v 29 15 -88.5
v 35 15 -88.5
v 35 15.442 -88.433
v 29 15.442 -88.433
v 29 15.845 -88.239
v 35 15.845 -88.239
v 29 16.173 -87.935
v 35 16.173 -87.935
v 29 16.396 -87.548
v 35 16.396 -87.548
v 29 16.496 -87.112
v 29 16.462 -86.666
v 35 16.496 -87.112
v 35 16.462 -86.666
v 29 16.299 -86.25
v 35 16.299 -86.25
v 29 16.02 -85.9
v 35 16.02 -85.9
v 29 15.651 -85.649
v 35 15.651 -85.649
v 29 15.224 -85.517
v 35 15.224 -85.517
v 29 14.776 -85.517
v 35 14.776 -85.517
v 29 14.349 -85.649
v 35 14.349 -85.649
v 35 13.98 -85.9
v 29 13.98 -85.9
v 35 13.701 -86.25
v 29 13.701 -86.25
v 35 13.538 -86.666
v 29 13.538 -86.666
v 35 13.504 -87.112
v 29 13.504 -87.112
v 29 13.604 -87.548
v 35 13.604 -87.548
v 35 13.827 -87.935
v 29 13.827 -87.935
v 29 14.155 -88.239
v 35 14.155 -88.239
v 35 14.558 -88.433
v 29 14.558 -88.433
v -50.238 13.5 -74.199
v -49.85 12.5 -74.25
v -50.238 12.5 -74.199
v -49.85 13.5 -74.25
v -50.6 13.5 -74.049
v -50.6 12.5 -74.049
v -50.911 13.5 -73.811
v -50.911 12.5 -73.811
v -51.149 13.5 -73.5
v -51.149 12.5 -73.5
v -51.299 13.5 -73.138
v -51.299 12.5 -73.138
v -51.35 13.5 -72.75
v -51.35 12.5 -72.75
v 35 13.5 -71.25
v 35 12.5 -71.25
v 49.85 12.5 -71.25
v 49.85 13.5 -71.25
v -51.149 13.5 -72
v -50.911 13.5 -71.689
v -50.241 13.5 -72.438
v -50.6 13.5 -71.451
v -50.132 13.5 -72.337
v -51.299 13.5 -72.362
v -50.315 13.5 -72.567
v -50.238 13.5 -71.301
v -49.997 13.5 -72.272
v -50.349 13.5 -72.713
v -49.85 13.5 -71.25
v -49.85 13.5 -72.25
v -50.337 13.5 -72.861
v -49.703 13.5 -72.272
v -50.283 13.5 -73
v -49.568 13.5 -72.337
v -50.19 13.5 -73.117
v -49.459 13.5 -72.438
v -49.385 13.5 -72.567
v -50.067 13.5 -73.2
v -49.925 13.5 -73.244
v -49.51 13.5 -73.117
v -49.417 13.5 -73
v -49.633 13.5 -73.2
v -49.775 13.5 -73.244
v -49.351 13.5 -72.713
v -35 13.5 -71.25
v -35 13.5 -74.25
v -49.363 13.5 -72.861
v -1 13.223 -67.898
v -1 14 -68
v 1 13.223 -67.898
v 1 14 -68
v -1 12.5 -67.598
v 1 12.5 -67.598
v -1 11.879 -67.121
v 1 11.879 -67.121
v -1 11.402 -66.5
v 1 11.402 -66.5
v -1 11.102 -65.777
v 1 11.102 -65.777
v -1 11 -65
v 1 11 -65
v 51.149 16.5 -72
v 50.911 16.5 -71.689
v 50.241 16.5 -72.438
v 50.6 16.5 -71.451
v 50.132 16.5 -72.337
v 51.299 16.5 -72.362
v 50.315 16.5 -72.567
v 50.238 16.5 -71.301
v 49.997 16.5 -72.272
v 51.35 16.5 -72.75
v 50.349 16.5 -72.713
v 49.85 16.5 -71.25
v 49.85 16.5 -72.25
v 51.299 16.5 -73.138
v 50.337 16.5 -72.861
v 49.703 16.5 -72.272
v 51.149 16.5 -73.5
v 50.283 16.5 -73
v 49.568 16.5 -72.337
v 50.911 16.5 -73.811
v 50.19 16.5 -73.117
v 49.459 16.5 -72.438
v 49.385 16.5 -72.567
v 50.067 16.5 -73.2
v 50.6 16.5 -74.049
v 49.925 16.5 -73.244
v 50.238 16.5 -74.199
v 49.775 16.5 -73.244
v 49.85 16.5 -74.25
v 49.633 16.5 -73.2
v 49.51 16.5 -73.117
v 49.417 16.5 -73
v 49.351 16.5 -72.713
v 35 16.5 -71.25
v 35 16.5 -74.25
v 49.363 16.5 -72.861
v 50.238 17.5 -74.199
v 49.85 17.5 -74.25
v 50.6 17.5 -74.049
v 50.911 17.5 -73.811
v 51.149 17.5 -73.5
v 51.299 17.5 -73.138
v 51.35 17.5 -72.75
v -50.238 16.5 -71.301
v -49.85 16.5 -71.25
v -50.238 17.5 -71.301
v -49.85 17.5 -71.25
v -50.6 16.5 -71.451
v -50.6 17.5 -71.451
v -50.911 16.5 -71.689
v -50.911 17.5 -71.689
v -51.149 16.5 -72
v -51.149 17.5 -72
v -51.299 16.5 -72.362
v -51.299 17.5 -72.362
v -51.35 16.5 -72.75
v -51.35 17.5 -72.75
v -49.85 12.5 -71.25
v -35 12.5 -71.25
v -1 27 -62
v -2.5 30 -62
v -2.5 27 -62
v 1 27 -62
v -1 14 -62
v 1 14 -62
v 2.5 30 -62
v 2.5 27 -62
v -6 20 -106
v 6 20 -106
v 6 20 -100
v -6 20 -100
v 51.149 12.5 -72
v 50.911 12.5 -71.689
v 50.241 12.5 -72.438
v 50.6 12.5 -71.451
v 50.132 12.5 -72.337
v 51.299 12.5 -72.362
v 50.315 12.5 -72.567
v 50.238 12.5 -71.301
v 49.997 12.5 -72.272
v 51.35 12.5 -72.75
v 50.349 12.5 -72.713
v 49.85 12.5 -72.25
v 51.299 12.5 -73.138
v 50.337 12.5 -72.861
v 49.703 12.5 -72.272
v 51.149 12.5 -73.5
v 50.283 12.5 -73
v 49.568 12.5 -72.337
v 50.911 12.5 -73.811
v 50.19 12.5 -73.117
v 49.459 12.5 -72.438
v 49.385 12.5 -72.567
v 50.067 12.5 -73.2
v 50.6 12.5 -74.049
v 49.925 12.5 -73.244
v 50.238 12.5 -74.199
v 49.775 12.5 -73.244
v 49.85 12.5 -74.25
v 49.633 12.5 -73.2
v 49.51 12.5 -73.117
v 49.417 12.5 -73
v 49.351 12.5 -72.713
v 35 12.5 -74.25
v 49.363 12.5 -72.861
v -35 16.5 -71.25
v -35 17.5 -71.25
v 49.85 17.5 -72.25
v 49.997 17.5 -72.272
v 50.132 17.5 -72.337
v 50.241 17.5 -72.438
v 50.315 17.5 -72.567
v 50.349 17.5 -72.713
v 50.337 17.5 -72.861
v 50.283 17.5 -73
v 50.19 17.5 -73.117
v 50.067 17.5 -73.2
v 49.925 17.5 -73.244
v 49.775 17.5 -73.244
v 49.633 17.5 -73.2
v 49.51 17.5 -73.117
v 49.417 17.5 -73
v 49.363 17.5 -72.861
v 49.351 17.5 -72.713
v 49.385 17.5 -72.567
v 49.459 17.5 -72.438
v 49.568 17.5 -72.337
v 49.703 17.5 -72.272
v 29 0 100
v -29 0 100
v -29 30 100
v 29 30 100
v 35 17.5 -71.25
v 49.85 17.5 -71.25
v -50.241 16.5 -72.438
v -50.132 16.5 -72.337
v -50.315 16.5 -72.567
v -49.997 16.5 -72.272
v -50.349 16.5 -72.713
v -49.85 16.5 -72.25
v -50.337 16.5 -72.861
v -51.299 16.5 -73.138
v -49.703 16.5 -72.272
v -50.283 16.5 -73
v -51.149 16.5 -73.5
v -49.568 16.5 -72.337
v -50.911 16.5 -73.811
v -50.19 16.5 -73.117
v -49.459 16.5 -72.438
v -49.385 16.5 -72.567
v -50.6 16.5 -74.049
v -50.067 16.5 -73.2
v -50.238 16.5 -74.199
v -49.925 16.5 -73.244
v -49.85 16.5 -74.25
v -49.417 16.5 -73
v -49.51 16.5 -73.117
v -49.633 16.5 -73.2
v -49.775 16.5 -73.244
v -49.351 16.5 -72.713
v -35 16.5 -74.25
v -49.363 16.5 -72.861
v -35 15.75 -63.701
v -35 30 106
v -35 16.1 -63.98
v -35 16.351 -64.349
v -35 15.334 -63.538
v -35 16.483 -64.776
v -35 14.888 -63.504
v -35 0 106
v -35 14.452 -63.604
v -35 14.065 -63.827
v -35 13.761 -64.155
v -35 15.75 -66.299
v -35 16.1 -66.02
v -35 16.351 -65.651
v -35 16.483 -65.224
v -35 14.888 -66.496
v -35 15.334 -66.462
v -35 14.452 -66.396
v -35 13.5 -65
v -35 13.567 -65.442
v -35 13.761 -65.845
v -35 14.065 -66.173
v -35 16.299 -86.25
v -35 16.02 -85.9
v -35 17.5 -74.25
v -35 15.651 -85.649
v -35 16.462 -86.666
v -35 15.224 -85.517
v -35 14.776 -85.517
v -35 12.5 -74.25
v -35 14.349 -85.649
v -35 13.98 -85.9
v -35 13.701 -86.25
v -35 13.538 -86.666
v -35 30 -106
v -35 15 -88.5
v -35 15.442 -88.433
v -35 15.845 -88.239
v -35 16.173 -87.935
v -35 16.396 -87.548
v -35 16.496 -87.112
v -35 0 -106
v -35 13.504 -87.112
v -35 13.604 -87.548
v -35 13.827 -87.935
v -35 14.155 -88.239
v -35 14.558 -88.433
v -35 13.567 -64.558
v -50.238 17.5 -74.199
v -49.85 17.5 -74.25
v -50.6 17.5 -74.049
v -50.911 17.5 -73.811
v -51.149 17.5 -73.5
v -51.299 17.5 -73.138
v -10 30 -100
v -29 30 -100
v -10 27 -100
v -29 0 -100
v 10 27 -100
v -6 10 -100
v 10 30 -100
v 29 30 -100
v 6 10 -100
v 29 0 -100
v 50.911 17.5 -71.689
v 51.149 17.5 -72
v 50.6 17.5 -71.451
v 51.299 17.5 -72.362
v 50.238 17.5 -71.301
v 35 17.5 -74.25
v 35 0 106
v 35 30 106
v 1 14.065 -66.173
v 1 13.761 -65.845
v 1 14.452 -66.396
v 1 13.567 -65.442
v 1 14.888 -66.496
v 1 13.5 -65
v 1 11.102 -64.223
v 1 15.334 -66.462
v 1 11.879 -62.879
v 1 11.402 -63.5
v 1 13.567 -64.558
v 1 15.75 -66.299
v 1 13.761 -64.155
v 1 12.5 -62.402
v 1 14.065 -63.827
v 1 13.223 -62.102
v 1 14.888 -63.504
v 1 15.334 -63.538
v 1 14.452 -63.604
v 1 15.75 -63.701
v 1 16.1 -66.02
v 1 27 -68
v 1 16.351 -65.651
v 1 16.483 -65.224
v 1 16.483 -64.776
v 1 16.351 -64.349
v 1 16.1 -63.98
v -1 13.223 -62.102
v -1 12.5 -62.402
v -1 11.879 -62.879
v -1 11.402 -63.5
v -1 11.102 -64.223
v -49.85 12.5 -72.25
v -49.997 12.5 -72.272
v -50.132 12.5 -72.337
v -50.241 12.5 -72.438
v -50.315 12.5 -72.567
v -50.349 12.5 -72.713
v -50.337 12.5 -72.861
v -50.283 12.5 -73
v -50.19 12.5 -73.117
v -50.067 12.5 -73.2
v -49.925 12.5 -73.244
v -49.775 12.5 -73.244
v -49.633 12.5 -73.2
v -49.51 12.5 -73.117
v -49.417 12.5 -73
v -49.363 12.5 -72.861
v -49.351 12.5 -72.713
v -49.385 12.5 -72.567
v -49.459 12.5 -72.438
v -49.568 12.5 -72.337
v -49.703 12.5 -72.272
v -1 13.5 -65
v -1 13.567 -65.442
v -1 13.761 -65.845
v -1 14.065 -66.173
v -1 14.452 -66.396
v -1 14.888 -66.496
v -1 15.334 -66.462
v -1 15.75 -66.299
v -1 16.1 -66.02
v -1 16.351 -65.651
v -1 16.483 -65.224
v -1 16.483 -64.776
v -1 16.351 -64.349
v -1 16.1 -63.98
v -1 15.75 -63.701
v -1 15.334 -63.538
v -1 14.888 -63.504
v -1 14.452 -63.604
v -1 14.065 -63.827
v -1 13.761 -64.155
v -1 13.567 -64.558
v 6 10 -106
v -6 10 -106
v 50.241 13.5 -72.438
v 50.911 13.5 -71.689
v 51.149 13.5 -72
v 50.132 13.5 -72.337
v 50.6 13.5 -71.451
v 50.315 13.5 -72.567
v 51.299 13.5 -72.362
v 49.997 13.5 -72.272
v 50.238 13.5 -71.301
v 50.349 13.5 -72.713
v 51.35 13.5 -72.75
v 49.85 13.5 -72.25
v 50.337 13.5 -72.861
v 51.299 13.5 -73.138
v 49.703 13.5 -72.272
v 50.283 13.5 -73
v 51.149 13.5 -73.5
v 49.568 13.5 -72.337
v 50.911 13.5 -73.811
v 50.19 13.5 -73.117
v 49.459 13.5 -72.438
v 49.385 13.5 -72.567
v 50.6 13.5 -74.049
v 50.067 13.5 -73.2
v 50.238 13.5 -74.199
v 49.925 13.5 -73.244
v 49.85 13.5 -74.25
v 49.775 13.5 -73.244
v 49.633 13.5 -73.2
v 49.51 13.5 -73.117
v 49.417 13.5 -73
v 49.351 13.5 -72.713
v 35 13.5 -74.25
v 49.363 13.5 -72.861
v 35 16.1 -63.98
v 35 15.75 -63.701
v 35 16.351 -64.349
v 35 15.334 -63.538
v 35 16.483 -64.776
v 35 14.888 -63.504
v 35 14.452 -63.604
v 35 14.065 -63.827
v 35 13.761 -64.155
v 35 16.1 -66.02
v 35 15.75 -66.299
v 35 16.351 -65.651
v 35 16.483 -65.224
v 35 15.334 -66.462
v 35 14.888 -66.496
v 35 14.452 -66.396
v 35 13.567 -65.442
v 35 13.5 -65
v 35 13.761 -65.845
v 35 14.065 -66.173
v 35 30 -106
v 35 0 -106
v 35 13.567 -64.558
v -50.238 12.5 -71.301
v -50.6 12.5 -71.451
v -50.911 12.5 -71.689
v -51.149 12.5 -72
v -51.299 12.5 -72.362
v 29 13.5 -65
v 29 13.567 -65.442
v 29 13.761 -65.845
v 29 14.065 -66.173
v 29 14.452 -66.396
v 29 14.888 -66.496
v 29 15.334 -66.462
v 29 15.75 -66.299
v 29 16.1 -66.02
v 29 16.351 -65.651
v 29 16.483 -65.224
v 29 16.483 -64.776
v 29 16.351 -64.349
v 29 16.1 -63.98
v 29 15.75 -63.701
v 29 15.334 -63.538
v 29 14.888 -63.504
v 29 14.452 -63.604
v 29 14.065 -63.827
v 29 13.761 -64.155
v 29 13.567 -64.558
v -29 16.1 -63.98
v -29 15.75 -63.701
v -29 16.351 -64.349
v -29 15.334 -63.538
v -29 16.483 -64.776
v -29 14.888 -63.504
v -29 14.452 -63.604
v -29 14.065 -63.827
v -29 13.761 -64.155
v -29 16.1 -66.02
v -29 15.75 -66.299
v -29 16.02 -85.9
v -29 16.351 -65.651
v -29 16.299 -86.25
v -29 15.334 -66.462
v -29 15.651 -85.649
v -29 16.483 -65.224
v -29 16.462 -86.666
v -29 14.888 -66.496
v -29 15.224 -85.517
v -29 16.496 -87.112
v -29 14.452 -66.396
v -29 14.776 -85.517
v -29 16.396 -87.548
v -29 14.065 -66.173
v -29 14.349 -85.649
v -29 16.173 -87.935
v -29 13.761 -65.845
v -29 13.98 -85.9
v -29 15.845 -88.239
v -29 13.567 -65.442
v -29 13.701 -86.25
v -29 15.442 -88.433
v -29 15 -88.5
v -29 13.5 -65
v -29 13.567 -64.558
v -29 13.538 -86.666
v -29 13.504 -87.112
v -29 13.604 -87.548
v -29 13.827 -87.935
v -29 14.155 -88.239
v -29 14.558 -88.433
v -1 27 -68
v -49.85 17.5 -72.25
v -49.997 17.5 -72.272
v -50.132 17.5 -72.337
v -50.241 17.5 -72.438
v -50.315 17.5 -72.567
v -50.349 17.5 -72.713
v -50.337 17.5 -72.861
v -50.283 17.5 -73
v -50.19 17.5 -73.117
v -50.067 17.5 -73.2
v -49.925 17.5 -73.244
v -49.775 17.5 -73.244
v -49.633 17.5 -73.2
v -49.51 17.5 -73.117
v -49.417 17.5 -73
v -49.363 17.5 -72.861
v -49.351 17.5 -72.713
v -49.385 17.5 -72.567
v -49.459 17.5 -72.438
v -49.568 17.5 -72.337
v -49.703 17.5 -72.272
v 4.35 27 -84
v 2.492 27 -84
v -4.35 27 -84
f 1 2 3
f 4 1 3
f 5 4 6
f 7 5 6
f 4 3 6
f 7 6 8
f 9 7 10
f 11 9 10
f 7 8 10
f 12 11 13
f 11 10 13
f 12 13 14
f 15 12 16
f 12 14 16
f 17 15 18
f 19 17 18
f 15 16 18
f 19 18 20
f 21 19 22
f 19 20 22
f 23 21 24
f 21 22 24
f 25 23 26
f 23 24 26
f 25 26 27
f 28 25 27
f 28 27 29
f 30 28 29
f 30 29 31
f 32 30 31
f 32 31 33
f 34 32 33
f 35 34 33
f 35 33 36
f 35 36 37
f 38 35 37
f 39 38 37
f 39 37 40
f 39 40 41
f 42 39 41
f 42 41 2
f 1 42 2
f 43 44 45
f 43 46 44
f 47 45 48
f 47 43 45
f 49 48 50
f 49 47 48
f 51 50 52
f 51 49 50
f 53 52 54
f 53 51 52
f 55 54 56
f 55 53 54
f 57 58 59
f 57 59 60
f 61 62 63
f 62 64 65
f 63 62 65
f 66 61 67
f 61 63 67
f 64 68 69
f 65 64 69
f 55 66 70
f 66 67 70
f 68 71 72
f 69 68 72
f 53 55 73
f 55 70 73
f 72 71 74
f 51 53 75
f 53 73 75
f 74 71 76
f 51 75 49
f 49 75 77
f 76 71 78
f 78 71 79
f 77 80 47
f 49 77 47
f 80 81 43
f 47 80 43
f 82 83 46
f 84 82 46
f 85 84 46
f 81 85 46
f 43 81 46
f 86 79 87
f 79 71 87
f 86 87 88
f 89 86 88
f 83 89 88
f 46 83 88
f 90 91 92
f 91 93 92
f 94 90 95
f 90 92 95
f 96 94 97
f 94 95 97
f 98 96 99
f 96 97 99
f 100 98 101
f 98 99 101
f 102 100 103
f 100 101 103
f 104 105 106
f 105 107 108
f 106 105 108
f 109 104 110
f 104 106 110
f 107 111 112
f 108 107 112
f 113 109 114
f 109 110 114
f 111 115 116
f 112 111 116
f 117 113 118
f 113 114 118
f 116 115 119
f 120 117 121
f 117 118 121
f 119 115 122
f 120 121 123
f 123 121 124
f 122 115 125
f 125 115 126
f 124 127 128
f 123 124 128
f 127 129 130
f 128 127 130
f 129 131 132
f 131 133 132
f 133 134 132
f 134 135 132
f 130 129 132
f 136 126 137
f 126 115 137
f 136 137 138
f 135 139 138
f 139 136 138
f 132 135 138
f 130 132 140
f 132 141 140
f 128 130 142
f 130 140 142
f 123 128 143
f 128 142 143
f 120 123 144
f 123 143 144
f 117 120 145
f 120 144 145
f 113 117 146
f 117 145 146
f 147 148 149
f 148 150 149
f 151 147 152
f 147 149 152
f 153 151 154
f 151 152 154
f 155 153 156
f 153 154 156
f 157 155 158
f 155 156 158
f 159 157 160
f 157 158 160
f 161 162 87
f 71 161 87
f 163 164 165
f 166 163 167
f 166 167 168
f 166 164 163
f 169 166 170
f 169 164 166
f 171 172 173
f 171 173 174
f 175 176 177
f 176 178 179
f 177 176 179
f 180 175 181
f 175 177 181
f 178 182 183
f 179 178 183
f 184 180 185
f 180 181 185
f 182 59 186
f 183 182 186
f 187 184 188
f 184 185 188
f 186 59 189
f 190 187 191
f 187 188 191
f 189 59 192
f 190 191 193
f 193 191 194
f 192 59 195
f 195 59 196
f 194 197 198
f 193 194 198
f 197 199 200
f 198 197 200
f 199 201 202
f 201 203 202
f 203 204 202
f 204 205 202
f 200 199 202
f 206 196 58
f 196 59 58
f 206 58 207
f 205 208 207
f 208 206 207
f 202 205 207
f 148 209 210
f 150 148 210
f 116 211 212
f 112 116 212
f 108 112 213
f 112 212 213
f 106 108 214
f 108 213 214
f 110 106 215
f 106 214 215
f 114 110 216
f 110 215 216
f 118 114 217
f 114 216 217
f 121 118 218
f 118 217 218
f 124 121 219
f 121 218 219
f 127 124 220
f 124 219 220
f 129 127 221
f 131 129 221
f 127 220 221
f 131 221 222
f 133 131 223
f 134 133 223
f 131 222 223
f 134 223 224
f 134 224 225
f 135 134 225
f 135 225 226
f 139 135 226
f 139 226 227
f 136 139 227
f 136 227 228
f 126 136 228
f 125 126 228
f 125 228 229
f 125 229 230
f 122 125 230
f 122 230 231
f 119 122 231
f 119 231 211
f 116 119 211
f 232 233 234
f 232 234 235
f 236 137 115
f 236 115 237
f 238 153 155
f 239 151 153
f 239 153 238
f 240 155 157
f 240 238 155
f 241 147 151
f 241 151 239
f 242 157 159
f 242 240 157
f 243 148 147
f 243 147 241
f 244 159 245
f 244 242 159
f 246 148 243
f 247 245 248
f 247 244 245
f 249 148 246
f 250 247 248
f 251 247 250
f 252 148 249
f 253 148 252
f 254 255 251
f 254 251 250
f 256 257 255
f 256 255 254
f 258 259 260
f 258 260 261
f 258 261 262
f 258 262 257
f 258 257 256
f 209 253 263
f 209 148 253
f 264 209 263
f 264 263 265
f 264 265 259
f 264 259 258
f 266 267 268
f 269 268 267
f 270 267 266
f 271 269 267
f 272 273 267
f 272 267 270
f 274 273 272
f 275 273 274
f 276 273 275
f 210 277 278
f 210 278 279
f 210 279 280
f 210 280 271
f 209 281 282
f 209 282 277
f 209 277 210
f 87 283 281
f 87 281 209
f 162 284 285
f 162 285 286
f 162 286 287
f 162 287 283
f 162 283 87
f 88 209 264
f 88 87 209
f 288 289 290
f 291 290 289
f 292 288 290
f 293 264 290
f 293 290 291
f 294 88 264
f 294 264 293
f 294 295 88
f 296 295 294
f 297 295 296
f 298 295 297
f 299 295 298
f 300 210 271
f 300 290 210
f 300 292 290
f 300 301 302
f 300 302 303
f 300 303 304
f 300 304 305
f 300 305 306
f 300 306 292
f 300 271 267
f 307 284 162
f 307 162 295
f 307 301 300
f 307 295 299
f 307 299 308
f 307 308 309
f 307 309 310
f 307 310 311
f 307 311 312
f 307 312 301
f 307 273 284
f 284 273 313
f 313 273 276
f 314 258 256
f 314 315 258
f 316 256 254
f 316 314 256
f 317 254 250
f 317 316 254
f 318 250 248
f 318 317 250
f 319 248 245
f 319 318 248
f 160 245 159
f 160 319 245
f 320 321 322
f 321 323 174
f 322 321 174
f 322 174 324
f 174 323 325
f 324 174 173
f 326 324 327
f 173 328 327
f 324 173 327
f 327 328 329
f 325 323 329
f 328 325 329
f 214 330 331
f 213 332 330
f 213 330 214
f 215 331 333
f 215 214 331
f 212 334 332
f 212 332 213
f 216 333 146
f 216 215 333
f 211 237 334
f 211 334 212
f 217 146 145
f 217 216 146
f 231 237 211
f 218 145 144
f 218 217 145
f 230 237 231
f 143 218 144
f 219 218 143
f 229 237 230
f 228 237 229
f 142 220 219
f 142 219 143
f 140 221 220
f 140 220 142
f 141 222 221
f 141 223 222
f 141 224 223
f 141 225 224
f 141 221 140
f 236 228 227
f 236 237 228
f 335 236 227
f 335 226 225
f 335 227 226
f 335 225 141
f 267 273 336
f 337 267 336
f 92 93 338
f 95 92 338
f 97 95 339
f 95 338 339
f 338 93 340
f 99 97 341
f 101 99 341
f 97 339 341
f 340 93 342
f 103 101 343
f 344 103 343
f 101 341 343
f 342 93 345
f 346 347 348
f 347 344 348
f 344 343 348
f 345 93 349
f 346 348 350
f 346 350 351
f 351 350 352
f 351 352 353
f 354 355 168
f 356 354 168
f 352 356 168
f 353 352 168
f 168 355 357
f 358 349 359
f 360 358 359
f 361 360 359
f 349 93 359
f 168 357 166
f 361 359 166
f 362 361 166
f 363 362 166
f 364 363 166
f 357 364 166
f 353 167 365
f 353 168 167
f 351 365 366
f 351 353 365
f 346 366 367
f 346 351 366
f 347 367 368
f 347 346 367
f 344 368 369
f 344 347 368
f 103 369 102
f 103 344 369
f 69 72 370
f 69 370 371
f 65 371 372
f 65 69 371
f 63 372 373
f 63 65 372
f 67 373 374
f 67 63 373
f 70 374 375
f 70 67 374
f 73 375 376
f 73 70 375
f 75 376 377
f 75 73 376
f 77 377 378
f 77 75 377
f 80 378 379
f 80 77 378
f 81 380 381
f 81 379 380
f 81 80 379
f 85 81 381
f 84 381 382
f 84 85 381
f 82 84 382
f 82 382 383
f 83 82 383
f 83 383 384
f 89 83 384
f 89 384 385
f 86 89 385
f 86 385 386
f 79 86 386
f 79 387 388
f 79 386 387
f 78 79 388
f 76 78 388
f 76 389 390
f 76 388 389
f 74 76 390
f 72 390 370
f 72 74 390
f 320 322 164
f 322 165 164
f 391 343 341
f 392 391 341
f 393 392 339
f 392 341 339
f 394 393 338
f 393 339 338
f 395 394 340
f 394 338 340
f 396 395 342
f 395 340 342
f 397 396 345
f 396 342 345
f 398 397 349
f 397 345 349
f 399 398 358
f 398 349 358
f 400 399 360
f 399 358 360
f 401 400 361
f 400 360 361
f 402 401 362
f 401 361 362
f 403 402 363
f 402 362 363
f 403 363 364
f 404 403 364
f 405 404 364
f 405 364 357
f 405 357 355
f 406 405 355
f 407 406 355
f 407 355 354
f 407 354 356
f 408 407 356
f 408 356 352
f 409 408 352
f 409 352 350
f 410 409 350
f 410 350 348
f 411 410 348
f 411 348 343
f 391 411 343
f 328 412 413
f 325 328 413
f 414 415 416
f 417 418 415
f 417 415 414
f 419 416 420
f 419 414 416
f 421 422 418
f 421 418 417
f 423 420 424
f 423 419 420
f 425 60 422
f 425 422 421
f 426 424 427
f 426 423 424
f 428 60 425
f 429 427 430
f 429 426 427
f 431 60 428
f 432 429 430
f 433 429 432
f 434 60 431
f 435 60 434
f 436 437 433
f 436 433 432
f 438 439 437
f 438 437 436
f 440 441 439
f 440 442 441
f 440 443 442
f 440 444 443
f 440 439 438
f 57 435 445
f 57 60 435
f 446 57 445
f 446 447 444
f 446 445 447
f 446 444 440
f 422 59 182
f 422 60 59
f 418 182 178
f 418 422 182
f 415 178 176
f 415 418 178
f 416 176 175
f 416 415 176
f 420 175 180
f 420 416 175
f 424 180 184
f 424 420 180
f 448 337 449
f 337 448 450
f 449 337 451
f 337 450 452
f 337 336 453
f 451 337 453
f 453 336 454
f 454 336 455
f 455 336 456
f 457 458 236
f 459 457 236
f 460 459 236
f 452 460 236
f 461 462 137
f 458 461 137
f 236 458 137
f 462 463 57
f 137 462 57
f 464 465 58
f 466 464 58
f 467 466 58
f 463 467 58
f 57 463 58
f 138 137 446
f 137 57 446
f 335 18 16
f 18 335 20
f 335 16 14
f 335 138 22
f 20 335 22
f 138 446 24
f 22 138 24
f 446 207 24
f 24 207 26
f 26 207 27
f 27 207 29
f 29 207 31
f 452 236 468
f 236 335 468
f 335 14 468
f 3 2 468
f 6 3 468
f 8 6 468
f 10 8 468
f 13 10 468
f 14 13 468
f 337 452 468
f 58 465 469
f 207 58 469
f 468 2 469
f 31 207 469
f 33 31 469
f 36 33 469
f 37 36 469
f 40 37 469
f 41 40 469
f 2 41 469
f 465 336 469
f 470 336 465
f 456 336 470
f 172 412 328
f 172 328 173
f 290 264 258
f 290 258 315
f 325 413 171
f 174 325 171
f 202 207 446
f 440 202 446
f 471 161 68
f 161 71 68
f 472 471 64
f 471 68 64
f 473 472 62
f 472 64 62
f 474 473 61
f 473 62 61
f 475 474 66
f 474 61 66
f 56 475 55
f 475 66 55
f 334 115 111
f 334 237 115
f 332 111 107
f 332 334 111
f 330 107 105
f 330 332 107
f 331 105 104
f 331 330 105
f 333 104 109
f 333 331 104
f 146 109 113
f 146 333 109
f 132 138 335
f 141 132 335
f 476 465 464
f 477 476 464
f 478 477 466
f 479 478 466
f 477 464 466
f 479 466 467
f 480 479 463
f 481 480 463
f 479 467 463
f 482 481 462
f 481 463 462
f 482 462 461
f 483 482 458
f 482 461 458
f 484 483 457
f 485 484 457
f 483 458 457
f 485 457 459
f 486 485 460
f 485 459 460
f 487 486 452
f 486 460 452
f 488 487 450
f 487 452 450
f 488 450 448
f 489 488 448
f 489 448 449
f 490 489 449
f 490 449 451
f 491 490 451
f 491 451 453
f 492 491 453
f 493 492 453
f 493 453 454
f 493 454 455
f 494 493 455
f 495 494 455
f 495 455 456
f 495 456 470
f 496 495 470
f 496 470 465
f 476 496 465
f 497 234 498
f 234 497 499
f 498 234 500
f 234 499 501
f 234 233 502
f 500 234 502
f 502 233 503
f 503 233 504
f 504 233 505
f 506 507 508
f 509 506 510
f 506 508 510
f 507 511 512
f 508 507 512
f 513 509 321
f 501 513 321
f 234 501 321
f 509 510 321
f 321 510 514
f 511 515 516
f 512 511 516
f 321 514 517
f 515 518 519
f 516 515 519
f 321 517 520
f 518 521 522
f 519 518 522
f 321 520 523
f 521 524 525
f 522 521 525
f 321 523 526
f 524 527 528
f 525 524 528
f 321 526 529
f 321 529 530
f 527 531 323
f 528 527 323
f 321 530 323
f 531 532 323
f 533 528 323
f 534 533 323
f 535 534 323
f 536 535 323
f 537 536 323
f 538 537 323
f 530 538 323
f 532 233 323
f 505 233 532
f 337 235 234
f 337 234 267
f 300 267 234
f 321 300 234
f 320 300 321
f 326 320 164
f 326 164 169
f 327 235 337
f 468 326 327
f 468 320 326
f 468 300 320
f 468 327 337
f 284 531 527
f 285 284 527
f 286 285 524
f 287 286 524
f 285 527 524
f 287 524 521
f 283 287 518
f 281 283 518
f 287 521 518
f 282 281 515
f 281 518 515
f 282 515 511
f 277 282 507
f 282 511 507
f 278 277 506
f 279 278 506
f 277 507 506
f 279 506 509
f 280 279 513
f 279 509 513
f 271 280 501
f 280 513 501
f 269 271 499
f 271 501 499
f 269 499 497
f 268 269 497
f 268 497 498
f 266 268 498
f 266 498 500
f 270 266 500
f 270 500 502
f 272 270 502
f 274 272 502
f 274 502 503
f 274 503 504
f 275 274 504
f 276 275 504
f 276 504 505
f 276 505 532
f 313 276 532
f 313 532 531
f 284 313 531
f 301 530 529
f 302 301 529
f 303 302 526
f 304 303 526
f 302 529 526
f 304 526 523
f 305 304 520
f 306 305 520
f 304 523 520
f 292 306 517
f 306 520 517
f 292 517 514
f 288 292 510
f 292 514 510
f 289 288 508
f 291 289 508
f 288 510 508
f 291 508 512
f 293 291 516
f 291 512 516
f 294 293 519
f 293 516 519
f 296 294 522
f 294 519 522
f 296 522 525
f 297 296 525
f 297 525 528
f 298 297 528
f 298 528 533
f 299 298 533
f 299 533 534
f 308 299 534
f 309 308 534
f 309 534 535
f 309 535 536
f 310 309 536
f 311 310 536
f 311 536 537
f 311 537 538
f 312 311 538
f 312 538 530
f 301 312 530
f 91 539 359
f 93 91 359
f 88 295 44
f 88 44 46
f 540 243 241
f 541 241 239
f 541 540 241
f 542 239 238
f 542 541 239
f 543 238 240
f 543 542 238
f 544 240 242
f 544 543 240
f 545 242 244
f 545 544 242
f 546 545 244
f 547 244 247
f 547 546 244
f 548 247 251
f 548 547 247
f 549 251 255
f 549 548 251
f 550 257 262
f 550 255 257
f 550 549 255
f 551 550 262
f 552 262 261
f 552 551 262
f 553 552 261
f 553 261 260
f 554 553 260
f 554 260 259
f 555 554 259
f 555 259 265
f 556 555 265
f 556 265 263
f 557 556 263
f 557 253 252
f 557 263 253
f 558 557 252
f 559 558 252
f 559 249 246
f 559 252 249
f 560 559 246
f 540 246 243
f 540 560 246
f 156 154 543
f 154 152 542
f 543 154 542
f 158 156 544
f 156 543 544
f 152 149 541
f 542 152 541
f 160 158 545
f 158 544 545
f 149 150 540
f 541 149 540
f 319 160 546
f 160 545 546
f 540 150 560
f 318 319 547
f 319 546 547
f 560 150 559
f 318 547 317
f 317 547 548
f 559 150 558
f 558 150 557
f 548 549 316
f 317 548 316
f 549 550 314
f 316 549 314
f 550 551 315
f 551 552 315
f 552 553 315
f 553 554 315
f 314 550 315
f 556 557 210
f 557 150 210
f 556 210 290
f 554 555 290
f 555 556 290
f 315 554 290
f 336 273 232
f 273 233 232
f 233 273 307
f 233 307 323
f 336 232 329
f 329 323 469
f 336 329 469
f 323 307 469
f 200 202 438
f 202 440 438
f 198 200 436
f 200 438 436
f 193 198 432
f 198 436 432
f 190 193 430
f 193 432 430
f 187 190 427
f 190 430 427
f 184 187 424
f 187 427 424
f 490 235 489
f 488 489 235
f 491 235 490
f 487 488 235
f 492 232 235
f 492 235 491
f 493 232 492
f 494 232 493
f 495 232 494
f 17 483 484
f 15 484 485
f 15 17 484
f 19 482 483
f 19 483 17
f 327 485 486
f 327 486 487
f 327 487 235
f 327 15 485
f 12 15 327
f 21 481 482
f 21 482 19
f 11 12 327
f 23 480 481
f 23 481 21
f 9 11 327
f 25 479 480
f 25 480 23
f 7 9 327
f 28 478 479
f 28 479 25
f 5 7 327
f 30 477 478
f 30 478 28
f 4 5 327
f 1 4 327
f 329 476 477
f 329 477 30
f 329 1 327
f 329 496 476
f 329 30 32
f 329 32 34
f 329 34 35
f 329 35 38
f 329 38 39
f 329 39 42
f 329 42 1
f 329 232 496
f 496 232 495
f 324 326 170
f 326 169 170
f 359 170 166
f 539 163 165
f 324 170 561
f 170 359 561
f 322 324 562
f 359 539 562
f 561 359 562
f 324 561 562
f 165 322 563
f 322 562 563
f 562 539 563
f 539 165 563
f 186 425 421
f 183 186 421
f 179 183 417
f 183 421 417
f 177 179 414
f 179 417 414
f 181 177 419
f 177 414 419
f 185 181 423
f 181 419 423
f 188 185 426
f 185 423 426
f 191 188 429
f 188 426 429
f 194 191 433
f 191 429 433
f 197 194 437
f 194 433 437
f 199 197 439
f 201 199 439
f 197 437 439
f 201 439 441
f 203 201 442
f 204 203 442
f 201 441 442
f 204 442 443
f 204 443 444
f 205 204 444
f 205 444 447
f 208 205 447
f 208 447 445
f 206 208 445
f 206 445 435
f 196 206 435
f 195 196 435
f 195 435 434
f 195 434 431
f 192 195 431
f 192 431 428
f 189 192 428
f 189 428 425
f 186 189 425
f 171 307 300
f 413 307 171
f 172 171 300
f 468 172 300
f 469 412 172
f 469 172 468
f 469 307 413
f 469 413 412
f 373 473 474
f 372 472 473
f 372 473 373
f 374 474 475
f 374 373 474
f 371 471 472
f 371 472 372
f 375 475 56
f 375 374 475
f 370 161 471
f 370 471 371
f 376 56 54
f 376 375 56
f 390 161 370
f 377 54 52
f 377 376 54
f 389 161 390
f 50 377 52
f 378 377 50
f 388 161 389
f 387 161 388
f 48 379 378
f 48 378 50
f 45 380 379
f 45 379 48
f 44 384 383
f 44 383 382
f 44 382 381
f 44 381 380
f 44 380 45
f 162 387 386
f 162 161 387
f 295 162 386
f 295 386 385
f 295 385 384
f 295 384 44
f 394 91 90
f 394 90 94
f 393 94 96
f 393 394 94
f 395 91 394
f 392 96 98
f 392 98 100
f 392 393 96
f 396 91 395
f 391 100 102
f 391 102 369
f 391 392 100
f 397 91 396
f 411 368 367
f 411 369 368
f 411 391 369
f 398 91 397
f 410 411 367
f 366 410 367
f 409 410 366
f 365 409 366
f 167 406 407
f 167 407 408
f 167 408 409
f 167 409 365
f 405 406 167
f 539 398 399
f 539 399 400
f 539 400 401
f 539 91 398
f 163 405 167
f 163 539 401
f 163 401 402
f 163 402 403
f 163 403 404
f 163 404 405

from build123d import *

# Parameters (mm, degrees)
SKETCH1_W            = 70
SKETCH1_H            = 212
SKETCH1_W_2          = 58
SKETCH1_H_2          = 200
BOSS_EXTRUDE1_DEPTH  = 30
SKETCH10_W           = 2
SKETCH10_H           = 6
BOSS_EXTRUDE3_DEPTH  = 16
FILLET2_R            = 3
SKETCH2_R            = 1.5
CUT_EXTRUDE1_DEPTH   = 131.52202895
CUT_EXTRUDE2_REACH   = 218.954
SKETCH3_W            = 12
SKETCH3_H            = 10
SKETCH4_W            = 3
SKETCH4_H            = 1
BOSS_EXTRUDE2_DEPTH  = 16.35
FILLET1_R            = 1.5
SKETCH6_R            = 0.5
CUT_EXTRUDE4_DEPTH   = 120.075910751
FILLET1_OF_MIRROR2_R = 1.5


with BuildPart() as part:
    # Sketch1 → Boss-Extrude1 (new body)
    with BuildSketch(Plane(origin=(0, 0, 0), x_dir=(1, 0, 0), z_dir=(0, 1, 0))):
        Rectangle(SKETCH1_W, SKETCH1_H)
        Rectangle(SKETCH1_W_2, SKETCH1_H_2, mode=Mode.SUBTRACT)
    extrude(amount=BOSS_EXTRUDE1_DEPTH)

    # Sketch7 → Loft3 section 0
    with BuildSketch(Plane.XY.offset(-100)):
        with BuildLine():
            Line((-10, 30), (10, 30))
            Line((10, 30), (10, 27))
            Line((10, 27), (-10, 27))
            Line((-10, 27), (-10, 30))
        make_face()
    # Sketch8 → Loft3 section 1
    with BuildSketch(Plane.XY.offset(-62)):
        with BuildLine():
            Line((-2.5, 30), (2.5, 30))
            Line((2.5, 30), (2.5, 27))
            Line((2.5, 27), (-2.5, 27))
            Line((-2.5, 27), (-2.5, 30))
        make_face()
    loft()

    # Sketch10 → Boss-Extrude3 (add)
    with BuildSketch(Plane.XZ.offset(-27)):
        with Locations((0, -65)):
            Rectangle(SKETCH10_W, SKETCH10_H)
    extrude(amount=BOSS_EXTRUDE3_DEPTH)

    # Fillet2
    fillet2_edges = [part.edges().sort_by_distance(p)[0] for p in [
        (0, 11, -68),
        (0, 11, -62),
    ]]
    fillet(fillet2_edges, radius=FILLET2_R - 0.0001)  # a hair under: the kernel refuses the full size

    # Sketch2 → Cut-Extrude1 (cut, through all)
    with BuildSketch(Plane(origin=(35, 0, 0), x_dir=(0, 0, -1), z_dir=(1, 0, 0))):
        with Locations(Location((65, 15, 0), (0, 0, 270))):
            Circle(SKETCH2_R)
        with Locations((87, 15)):
            Circle(SKETCH2_R)
    extrude(amount=-CUT_EXTRUDE1_DEPTH, mode=Mode.SUBTRACT)

    # Sketch3 → Cut-Extrude2 (cut, up to next)
    with BuildSketch(Plane(origin=(0, 0, -106), x_dir=(-1, 0, 0), z_dir=(0, 0, -1)), mode=Mode.PRIVATE) as cut_extrude2_sk1:
        with Locations((0, 15)):
            Rectangle(SKETCH3_W, SKETCH3_H)
    cut_extrude2_tool1 = extrude(cut_extrude2_sk1.sketch, amount=-CUT_EXTRUDE2_REACH, mode=Mode.PRIVATE) & part.part
    add(cut_extrude2_tool1.solids().sort_by_distance((0, 15, -106))[0], mode=Mode.SUBTRACT)

    # Sketch4 → Boss-Extrude2 (add)
    with BuildSketch(Plane(origin=(35, 0, 0), x_dir=(0, 0, -1), z_dir=(1, 0, 0))):
        with Locations((72.75, 13)):
            Rectangle(SKETCH4_W, SKETCH4_H)
        with Locations((72.75, 17)):
            Rectangle(SKETCH4_W, SKETCH4_H)
    boss_extrude2 = extrude(amount=BOSS_EXTRUDE2_DEPTH)

    # Fillet1
    fillet1_edges = [part.edges().sort_by_distance(p)[0] for p in [
        (51.35, 13, -74.25),
        (51.35, 13, -71.25),
        (51.35, 17, -71.25),
        (51.35, 17, -74.25),
    ]]
    fillet(fillet1_edges, radius=FILLET1_R - 0.0001)  # a hair under: the kernel refuses the full size

    # Sketch6 → Cut-Extrude4 (cut, through all)
    with BuildSketch(Plane(origin=(0, 17.5, 0), x_dir=(1, 0, 0), z_dir=(0, 1, 0))):
        with Locations(Location((49.85, 72.75, 0), (0, 0, 270))):
            Circle(SKETCH6_R)
    cut_extrude4 = extrude(amount=-CUT_EXTRUDE4_DEPTH, mode=Mode.SUBTRACT)

    # Mirror2: Boss-Extrude2, Cut-Extrude4 across plane
    add(boss_extrude2.mirror(Plane(origin=(0, 0, 0), x_dir=(0, 0, 1), z_dir=(1, 0, 0))))
    add(cut_extrude4.mirror(Plane(origin=(0, 0, 0), x_dir=(0, 0, 1), z_dir=(1, 0, 0))), mode=Mode.SUBTRACT)

    # Fillet1 of Mirror2
    fillet1_of_mirror2_edges = [part.edges().sort_by_distance(p)[0] for p in [
        (-51.35, 13, -74.25),
        (-51.35, 13, -71.25),
        (-51.35, 17, -71.25),
        (-51.35, 17, -74.25),
    ]]
    fillet(fillet1_of_mirror2_edges, radius=FILLET1_OF_MIRROR2_R - 0.0001)  # a hair under: the kernel refuses the full size


solid = part.part
